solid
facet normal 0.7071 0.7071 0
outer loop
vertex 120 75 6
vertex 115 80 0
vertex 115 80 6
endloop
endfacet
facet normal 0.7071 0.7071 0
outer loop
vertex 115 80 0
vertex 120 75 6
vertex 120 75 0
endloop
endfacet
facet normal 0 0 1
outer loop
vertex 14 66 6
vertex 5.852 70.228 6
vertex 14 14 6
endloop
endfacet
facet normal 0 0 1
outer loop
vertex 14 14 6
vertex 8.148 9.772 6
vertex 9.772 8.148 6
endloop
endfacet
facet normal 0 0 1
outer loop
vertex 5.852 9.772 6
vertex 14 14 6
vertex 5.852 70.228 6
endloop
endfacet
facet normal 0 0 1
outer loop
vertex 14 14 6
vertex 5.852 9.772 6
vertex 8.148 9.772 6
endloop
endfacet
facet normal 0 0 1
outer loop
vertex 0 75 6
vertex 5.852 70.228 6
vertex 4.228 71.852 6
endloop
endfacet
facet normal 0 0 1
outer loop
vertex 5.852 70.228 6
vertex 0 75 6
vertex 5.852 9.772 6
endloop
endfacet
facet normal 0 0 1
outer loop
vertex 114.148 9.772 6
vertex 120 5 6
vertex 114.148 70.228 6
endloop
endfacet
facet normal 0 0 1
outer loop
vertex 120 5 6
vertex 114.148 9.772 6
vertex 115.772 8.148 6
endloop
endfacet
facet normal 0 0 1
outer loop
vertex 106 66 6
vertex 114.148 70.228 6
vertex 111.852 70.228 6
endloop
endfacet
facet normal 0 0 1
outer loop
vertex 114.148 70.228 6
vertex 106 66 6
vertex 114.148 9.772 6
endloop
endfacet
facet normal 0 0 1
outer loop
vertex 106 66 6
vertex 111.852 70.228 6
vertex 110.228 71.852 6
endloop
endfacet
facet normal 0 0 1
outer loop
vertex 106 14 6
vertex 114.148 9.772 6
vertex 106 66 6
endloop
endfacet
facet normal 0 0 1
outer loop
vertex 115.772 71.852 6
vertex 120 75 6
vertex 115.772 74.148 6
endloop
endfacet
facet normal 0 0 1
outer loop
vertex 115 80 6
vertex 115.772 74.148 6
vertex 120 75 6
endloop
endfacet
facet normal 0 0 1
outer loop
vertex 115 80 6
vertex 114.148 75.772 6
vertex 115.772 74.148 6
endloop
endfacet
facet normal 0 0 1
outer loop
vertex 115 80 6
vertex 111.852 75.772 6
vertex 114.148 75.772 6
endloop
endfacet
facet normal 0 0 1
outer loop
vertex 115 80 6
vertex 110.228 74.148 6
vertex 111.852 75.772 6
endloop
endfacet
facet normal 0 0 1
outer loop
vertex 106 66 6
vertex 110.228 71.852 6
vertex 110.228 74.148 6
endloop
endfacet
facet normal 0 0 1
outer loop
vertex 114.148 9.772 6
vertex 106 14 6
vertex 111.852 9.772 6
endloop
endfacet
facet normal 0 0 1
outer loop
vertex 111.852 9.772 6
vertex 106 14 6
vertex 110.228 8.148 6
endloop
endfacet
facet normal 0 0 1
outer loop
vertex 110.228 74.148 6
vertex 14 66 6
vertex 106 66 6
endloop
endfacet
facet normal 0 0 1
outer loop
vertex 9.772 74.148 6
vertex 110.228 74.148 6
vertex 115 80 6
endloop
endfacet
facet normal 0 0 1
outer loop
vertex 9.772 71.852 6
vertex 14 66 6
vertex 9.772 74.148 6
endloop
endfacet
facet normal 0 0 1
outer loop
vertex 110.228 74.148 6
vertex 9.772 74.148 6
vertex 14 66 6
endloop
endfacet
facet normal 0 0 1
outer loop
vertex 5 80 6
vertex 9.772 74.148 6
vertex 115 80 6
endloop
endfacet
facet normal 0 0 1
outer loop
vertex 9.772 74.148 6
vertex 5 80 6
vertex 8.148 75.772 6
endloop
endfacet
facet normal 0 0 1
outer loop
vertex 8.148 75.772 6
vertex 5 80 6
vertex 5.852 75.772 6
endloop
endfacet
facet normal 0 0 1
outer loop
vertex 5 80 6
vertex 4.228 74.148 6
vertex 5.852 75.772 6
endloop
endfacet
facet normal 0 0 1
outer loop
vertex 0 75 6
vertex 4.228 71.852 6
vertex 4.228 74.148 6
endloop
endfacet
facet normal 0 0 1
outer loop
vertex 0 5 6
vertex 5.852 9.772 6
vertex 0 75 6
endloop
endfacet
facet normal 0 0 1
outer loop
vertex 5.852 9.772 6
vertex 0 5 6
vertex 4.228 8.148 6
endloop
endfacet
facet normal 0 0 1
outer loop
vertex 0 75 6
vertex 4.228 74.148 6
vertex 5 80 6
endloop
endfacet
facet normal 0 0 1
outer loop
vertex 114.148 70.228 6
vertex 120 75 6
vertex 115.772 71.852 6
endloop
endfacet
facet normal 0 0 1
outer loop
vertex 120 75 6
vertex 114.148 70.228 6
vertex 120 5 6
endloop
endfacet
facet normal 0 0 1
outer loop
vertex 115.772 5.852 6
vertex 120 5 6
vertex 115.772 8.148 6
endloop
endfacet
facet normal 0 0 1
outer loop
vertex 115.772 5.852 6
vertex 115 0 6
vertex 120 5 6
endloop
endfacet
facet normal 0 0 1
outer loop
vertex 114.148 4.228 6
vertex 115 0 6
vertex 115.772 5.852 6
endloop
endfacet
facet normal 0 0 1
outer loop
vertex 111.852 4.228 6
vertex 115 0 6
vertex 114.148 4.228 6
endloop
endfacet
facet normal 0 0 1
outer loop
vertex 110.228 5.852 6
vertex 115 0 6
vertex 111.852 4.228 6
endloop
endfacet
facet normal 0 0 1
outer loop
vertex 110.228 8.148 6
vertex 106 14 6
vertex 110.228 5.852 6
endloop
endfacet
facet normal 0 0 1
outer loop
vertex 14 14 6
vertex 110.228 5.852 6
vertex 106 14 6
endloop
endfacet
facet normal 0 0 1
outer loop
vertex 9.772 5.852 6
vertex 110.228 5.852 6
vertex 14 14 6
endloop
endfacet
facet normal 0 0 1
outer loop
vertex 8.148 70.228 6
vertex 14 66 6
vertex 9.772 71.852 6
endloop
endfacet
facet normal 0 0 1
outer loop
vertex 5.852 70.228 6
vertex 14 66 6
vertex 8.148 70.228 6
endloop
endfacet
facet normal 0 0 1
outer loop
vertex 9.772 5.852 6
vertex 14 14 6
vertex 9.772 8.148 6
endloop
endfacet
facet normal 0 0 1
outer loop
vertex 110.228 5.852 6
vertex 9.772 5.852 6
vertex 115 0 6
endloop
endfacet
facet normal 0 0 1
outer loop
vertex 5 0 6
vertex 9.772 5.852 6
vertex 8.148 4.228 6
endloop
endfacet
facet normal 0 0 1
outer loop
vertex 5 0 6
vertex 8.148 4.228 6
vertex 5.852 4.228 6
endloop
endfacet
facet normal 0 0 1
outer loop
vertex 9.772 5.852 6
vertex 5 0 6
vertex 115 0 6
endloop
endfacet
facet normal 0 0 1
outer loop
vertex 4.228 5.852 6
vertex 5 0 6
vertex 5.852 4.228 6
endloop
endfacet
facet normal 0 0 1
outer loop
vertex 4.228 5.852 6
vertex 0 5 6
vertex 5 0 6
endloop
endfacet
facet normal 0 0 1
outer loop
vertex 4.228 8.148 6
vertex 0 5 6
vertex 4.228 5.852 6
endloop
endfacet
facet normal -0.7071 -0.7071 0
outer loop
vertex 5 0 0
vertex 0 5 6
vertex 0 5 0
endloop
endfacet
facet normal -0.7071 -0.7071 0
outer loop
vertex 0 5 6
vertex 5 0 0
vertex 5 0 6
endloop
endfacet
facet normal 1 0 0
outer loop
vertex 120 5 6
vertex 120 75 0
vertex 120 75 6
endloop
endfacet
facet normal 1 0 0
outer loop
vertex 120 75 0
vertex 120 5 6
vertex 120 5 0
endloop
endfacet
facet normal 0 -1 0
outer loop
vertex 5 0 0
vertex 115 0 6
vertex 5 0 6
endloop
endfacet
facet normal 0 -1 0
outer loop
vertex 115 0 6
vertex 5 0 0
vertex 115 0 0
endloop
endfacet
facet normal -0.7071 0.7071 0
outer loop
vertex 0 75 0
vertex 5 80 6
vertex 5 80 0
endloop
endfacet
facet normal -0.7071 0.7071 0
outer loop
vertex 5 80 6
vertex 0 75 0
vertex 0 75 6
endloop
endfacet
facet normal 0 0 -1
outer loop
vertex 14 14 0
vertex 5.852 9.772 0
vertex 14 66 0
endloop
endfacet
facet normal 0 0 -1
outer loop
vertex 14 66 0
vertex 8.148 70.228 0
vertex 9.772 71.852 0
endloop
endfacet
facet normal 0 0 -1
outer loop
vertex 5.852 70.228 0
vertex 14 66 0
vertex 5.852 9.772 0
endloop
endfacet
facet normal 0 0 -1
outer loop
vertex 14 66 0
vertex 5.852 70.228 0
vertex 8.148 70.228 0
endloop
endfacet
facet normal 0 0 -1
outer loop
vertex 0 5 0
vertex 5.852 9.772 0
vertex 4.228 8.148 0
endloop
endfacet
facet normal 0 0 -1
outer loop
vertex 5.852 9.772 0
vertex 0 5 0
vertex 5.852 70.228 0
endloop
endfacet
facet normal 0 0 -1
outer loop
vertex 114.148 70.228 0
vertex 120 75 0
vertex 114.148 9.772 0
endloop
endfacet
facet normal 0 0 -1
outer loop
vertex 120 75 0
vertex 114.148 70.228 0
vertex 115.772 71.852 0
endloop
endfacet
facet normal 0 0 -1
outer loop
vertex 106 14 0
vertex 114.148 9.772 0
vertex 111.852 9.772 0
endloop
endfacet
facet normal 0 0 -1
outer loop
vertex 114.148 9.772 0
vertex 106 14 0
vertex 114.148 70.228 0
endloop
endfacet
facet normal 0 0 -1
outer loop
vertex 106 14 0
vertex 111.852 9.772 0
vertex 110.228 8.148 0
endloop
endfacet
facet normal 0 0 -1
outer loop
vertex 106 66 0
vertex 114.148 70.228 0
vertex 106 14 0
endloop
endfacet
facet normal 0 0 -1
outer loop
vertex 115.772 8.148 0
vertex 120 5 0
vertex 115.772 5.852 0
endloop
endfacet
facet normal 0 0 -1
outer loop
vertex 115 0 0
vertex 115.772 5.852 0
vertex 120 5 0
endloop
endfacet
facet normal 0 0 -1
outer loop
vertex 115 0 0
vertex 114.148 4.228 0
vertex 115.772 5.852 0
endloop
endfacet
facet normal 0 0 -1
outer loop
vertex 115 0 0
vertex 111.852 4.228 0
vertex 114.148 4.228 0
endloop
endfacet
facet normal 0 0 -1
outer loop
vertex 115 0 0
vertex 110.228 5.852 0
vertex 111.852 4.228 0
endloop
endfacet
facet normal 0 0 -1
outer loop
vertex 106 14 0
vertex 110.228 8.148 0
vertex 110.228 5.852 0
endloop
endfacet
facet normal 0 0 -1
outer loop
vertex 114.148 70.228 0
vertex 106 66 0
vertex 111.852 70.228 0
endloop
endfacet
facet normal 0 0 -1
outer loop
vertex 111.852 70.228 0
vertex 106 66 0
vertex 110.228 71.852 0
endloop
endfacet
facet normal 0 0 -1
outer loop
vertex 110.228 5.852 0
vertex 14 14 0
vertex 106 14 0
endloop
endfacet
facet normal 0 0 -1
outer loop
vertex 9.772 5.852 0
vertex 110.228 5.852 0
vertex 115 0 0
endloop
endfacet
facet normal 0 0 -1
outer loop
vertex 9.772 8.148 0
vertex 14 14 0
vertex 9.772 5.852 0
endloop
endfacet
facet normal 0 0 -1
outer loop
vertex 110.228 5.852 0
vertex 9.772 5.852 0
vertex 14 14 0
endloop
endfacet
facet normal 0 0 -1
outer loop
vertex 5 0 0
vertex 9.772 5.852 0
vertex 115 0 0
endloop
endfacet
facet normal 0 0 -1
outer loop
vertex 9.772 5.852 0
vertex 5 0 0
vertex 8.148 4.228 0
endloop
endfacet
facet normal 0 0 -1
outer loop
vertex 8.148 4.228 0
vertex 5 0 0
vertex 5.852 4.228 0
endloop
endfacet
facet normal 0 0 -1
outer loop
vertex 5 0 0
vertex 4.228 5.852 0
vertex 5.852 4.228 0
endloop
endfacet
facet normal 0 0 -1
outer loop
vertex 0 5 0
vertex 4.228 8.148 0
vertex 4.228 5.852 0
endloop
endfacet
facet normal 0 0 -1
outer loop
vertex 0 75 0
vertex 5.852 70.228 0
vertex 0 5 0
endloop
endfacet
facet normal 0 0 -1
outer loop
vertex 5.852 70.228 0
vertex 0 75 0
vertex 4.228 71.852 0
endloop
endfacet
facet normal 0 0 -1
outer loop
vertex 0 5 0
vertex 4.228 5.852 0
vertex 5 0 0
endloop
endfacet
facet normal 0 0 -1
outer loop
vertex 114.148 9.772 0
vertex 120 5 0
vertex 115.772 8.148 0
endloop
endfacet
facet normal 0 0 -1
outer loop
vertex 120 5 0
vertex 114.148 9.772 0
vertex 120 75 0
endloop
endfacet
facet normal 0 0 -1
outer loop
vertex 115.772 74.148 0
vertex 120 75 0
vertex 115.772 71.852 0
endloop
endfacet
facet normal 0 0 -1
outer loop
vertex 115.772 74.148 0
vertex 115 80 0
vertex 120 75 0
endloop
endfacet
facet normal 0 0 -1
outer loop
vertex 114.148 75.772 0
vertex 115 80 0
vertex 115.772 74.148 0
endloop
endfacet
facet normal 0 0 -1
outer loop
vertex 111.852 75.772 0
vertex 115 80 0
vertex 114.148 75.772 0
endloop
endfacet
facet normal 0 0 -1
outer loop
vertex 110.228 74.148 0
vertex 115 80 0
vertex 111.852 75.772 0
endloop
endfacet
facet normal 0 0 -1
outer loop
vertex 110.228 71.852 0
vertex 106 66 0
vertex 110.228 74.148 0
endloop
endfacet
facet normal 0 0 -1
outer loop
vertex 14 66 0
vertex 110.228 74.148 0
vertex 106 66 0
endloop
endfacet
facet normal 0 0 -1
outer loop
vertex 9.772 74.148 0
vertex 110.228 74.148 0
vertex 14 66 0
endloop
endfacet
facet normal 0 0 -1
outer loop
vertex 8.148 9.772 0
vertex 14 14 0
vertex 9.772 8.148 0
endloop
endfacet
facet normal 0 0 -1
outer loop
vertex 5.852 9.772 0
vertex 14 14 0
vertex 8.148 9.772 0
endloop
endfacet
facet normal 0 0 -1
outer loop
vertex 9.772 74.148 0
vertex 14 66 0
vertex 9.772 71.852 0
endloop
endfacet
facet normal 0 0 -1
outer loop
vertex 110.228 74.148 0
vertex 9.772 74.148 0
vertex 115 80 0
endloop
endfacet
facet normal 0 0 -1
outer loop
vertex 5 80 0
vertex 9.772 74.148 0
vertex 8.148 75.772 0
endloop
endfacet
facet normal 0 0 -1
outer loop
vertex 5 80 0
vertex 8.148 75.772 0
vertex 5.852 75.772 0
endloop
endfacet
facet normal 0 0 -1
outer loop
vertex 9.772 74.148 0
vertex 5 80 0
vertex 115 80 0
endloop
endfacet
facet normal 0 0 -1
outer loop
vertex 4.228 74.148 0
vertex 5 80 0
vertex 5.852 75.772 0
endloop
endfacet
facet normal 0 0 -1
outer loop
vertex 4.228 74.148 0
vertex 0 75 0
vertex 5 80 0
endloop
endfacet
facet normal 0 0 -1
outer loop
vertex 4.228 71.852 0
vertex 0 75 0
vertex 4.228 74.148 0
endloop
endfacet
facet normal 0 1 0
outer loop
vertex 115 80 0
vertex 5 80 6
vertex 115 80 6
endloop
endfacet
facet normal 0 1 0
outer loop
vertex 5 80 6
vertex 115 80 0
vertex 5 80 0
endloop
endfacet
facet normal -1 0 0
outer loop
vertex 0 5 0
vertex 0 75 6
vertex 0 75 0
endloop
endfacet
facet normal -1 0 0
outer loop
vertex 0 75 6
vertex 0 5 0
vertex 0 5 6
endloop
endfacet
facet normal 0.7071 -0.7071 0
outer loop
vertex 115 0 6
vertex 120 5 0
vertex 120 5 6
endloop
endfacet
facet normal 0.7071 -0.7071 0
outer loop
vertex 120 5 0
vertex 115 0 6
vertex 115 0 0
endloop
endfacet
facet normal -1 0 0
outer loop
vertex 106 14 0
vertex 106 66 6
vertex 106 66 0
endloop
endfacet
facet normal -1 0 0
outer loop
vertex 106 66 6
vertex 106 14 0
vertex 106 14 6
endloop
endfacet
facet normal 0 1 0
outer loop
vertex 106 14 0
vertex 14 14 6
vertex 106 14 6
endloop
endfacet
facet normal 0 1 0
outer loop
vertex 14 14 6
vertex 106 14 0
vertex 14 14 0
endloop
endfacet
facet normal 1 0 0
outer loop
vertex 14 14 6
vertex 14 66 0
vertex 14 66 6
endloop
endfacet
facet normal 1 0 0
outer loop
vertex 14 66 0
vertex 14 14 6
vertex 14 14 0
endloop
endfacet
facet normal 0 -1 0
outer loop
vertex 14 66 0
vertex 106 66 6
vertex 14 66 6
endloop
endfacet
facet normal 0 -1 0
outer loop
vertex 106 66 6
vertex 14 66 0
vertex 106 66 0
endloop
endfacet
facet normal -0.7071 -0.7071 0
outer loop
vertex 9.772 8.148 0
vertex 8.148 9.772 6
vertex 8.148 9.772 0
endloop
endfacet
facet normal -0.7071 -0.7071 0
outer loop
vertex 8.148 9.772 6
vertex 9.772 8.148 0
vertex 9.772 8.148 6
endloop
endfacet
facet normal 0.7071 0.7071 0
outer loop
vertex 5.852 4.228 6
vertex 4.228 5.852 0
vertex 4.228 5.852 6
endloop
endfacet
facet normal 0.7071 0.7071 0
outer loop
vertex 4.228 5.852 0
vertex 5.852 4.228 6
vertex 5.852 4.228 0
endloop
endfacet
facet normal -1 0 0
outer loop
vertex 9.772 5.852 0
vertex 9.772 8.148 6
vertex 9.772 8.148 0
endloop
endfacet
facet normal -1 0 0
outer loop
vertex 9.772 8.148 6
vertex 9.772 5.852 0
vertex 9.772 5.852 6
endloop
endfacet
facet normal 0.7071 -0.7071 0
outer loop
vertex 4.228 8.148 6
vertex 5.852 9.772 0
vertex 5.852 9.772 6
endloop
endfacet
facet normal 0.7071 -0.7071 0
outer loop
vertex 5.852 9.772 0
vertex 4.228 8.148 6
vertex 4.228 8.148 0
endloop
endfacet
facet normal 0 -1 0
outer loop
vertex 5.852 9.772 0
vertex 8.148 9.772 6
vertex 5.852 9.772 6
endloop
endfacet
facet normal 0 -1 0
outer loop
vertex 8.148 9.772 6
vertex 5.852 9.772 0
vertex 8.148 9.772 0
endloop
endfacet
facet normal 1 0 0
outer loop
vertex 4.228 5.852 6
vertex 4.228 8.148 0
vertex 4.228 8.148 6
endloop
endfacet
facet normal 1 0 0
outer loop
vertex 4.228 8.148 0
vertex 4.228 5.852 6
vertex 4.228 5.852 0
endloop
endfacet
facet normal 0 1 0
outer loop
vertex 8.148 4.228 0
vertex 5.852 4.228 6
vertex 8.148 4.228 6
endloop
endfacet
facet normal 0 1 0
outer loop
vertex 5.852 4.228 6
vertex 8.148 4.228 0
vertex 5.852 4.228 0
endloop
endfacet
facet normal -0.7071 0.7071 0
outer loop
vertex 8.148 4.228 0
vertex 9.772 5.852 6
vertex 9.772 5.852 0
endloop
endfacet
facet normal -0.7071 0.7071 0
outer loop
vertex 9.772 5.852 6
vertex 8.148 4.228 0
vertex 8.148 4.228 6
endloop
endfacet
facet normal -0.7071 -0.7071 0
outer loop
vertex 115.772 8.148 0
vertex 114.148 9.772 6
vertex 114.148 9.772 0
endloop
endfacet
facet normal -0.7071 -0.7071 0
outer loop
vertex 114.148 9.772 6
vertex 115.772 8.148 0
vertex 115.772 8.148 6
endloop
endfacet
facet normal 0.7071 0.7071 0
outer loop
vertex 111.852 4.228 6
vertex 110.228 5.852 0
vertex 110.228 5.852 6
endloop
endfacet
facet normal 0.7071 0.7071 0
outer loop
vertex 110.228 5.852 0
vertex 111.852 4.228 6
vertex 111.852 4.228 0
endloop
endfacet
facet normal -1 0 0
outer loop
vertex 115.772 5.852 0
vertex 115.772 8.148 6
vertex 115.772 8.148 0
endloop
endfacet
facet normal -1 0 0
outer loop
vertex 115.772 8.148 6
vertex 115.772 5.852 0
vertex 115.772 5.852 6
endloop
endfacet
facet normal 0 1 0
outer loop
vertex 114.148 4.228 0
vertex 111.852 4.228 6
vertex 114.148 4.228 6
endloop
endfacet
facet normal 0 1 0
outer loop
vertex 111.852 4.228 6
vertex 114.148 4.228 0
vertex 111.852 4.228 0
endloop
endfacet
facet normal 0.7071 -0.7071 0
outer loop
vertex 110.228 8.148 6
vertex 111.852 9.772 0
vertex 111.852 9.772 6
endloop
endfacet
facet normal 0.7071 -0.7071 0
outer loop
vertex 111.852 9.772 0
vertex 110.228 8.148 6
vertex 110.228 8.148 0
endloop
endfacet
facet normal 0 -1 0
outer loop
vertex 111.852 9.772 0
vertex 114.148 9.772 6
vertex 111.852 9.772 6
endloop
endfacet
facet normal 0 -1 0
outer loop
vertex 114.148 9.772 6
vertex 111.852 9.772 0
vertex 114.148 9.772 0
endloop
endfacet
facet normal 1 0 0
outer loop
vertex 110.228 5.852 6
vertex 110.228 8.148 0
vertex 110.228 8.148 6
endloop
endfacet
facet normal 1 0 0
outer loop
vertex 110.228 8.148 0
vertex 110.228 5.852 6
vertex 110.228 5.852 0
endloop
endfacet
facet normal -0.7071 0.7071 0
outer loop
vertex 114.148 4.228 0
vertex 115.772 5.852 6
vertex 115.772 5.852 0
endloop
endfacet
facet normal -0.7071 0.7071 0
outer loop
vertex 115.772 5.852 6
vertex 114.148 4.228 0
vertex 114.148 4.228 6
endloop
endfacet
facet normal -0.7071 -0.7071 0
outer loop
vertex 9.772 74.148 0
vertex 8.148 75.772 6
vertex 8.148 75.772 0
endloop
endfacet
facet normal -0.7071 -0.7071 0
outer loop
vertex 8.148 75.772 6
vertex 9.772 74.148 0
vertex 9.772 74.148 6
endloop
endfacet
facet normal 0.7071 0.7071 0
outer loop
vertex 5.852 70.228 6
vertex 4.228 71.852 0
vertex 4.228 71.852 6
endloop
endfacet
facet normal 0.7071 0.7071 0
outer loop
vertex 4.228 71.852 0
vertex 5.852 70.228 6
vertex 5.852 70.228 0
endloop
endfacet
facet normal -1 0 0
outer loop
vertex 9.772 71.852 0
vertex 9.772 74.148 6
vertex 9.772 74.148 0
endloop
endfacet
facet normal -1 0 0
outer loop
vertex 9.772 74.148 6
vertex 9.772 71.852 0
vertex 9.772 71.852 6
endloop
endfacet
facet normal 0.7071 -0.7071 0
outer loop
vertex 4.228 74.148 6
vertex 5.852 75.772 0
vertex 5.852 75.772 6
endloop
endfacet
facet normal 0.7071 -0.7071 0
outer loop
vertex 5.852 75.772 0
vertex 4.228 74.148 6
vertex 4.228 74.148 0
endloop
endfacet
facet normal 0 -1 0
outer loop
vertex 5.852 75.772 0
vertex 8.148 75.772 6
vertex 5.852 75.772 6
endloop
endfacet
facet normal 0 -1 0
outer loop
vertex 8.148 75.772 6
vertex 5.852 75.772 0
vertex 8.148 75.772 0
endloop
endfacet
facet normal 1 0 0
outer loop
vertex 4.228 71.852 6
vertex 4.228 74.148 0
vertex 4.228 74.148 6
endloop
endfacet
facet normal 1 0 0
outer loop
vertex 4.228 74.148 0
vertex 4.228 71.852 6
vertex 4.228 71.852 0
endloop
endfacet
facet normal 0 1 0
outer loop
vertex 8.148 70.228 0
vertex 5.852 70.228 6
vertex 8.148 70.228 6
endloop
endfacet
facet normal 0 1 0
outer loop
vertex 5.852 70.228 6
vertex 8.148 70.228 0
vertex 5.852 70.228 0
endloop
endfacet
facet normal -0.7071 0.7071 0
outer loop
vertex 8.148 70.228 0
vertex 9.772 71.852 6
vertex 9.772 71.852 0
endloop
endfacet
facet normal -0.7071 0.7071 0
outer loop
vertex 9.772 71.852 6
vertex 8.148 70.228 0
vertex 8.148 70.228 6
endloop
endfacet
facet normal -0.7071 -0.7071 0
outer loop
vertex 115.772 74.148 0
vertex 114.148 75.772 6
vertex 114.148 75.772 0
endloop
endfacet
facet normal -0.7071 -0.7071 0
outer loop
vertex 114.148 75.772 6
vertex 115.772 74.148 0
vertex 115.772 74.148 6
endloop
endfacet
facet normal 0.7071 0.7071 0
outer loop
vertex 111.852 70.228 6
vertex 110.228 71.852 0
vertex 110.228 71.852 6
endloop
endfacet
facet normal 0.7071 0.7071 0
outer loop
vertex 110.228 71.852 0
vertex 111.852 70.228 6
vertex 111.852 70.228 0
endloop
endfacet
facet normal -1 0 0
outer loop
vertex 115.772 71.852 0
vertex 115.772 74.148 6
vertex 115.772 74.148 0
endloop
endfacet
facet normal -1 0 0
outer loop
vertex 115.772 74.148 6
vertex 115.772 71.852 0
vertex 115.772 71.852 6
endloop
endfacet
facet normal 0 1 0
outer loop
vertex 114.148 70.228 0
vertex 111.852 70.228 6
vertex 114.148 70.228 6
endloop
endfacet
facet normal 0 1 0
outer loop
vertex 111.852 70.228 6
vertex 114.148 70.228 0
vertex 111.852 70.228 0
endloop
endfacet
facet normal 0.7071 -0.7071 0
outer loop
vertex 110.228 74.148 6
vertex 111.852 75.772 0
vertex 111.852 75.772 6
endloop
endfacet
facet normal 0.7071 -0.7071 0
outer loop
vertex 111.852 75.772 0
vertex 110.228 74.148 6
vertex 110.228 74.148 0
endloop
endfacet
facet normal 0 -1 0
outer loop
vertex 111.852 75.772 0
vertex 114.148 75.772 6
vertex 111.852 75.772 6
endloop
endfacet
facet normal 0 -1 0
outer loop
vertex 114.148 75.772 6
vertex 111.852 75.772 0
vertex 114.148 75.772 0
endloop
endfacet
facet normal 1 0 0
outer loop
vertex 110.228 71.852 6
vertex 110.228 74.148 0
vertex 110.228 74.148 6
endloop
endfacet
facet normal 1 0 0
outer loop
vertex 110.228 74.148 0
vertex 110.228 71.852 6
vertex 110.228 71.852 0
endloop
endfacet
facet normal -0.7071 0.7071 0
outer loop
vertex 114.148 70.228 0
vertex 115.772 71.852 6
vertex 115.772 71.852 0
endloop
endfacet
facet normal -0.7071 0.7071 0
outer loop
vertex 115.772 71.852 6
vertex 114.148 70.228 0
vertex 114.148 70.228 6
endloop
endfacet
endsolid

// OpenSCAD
$fn = 32;

// ----------------------------------------------------------------------
// Frame plate: 120 x 80 frame, 14 mm rails
// ----------------------------------------------------------------------

// --- parameters (mm) ---
plate_l = 120;            // plate length, X
plate_w = 80;             // plate width, Y
plate_t = 6;              // plate thickness, Z (extrusion height)
corner_c = 5;             // corner chamfer
frame_bar = 14;           // frame rail width
bolt_r = 3;               // corner bolt window radius
bolt_inset = 7;           // bolt centre inset from the edges

win_l = plate_l - 2 * frame_bar;  // window length
win_w = plate_w - 2 * frame_bar;  // window width
bolt_d = 2 * bolt_r;  // corner hole diameter

profile = [[5, 0], [115, 0], [120, 5], [120, 75], [115, 80], [5, 80], [0, 75], [0, 5]];  // primary outline, 8 points, counter clockwise
void_1 = [[14, 14], [106, 14], [106, 66], [14, 66]];  // the window, 4 points
void_2 = [[9.772, 8.148], [8.148, 9.772], [5.852, 9.772], [4.228, 8.148], [4.228, 5.852], [5.852, 4.228], [8.148, 4.228], [9.772, 5.852]];  // corner bolt window, 8 points
void_3 = [[115.772, 8.148], [114.148, 9.772], [111.852, 9.772], [110.228, 8.148], [110.228, 5.852], [111.852, 4.228], [114.148, 4.228], [115.772, 5.852]];  // corner bolt window, 8 points
void_4 = [[9.772, 74.148], [8.148, 75.772], [5.852, 75.772], [4.228, 74.148], [4.228, 71.852], [5.852, 70.228], [8.148, 70.228], [9.772, 71.852]];  // corner bolt window, 8 points
void_5 = [[115.772, 74.148], [114.148, 75.772], [111.852, 75.772], [110.228, 74.148], [110.228, 71.852], [111.852, 70.228], [114.148, 70.228], [115.772, 71.852]];  // corner bolt window, 8 points

// --- the one profile operation ---
difference() {
  linear_extrude(height = plate_t) polygon(points = profile);
  translate([0, 0, -1])
    linear_extrude(height = plate_t + 2) polygon(points = void_1);
  translate([0, 0, -1])
    linear_extrude(height = plate_t + 2) polygon(points = void_2);
  translate([0, 0, -1])
    linear_extrude(height = plate_t + 2) polygon(points = void_3);
  translate([0, 0, -1])
    linear_extrude(height = plate_t + 2) polygon(points = void_4);
  translate([0, 0, -1])
    linear_extrude(height = plate_t + 2) polygon(points = void_5);
}
